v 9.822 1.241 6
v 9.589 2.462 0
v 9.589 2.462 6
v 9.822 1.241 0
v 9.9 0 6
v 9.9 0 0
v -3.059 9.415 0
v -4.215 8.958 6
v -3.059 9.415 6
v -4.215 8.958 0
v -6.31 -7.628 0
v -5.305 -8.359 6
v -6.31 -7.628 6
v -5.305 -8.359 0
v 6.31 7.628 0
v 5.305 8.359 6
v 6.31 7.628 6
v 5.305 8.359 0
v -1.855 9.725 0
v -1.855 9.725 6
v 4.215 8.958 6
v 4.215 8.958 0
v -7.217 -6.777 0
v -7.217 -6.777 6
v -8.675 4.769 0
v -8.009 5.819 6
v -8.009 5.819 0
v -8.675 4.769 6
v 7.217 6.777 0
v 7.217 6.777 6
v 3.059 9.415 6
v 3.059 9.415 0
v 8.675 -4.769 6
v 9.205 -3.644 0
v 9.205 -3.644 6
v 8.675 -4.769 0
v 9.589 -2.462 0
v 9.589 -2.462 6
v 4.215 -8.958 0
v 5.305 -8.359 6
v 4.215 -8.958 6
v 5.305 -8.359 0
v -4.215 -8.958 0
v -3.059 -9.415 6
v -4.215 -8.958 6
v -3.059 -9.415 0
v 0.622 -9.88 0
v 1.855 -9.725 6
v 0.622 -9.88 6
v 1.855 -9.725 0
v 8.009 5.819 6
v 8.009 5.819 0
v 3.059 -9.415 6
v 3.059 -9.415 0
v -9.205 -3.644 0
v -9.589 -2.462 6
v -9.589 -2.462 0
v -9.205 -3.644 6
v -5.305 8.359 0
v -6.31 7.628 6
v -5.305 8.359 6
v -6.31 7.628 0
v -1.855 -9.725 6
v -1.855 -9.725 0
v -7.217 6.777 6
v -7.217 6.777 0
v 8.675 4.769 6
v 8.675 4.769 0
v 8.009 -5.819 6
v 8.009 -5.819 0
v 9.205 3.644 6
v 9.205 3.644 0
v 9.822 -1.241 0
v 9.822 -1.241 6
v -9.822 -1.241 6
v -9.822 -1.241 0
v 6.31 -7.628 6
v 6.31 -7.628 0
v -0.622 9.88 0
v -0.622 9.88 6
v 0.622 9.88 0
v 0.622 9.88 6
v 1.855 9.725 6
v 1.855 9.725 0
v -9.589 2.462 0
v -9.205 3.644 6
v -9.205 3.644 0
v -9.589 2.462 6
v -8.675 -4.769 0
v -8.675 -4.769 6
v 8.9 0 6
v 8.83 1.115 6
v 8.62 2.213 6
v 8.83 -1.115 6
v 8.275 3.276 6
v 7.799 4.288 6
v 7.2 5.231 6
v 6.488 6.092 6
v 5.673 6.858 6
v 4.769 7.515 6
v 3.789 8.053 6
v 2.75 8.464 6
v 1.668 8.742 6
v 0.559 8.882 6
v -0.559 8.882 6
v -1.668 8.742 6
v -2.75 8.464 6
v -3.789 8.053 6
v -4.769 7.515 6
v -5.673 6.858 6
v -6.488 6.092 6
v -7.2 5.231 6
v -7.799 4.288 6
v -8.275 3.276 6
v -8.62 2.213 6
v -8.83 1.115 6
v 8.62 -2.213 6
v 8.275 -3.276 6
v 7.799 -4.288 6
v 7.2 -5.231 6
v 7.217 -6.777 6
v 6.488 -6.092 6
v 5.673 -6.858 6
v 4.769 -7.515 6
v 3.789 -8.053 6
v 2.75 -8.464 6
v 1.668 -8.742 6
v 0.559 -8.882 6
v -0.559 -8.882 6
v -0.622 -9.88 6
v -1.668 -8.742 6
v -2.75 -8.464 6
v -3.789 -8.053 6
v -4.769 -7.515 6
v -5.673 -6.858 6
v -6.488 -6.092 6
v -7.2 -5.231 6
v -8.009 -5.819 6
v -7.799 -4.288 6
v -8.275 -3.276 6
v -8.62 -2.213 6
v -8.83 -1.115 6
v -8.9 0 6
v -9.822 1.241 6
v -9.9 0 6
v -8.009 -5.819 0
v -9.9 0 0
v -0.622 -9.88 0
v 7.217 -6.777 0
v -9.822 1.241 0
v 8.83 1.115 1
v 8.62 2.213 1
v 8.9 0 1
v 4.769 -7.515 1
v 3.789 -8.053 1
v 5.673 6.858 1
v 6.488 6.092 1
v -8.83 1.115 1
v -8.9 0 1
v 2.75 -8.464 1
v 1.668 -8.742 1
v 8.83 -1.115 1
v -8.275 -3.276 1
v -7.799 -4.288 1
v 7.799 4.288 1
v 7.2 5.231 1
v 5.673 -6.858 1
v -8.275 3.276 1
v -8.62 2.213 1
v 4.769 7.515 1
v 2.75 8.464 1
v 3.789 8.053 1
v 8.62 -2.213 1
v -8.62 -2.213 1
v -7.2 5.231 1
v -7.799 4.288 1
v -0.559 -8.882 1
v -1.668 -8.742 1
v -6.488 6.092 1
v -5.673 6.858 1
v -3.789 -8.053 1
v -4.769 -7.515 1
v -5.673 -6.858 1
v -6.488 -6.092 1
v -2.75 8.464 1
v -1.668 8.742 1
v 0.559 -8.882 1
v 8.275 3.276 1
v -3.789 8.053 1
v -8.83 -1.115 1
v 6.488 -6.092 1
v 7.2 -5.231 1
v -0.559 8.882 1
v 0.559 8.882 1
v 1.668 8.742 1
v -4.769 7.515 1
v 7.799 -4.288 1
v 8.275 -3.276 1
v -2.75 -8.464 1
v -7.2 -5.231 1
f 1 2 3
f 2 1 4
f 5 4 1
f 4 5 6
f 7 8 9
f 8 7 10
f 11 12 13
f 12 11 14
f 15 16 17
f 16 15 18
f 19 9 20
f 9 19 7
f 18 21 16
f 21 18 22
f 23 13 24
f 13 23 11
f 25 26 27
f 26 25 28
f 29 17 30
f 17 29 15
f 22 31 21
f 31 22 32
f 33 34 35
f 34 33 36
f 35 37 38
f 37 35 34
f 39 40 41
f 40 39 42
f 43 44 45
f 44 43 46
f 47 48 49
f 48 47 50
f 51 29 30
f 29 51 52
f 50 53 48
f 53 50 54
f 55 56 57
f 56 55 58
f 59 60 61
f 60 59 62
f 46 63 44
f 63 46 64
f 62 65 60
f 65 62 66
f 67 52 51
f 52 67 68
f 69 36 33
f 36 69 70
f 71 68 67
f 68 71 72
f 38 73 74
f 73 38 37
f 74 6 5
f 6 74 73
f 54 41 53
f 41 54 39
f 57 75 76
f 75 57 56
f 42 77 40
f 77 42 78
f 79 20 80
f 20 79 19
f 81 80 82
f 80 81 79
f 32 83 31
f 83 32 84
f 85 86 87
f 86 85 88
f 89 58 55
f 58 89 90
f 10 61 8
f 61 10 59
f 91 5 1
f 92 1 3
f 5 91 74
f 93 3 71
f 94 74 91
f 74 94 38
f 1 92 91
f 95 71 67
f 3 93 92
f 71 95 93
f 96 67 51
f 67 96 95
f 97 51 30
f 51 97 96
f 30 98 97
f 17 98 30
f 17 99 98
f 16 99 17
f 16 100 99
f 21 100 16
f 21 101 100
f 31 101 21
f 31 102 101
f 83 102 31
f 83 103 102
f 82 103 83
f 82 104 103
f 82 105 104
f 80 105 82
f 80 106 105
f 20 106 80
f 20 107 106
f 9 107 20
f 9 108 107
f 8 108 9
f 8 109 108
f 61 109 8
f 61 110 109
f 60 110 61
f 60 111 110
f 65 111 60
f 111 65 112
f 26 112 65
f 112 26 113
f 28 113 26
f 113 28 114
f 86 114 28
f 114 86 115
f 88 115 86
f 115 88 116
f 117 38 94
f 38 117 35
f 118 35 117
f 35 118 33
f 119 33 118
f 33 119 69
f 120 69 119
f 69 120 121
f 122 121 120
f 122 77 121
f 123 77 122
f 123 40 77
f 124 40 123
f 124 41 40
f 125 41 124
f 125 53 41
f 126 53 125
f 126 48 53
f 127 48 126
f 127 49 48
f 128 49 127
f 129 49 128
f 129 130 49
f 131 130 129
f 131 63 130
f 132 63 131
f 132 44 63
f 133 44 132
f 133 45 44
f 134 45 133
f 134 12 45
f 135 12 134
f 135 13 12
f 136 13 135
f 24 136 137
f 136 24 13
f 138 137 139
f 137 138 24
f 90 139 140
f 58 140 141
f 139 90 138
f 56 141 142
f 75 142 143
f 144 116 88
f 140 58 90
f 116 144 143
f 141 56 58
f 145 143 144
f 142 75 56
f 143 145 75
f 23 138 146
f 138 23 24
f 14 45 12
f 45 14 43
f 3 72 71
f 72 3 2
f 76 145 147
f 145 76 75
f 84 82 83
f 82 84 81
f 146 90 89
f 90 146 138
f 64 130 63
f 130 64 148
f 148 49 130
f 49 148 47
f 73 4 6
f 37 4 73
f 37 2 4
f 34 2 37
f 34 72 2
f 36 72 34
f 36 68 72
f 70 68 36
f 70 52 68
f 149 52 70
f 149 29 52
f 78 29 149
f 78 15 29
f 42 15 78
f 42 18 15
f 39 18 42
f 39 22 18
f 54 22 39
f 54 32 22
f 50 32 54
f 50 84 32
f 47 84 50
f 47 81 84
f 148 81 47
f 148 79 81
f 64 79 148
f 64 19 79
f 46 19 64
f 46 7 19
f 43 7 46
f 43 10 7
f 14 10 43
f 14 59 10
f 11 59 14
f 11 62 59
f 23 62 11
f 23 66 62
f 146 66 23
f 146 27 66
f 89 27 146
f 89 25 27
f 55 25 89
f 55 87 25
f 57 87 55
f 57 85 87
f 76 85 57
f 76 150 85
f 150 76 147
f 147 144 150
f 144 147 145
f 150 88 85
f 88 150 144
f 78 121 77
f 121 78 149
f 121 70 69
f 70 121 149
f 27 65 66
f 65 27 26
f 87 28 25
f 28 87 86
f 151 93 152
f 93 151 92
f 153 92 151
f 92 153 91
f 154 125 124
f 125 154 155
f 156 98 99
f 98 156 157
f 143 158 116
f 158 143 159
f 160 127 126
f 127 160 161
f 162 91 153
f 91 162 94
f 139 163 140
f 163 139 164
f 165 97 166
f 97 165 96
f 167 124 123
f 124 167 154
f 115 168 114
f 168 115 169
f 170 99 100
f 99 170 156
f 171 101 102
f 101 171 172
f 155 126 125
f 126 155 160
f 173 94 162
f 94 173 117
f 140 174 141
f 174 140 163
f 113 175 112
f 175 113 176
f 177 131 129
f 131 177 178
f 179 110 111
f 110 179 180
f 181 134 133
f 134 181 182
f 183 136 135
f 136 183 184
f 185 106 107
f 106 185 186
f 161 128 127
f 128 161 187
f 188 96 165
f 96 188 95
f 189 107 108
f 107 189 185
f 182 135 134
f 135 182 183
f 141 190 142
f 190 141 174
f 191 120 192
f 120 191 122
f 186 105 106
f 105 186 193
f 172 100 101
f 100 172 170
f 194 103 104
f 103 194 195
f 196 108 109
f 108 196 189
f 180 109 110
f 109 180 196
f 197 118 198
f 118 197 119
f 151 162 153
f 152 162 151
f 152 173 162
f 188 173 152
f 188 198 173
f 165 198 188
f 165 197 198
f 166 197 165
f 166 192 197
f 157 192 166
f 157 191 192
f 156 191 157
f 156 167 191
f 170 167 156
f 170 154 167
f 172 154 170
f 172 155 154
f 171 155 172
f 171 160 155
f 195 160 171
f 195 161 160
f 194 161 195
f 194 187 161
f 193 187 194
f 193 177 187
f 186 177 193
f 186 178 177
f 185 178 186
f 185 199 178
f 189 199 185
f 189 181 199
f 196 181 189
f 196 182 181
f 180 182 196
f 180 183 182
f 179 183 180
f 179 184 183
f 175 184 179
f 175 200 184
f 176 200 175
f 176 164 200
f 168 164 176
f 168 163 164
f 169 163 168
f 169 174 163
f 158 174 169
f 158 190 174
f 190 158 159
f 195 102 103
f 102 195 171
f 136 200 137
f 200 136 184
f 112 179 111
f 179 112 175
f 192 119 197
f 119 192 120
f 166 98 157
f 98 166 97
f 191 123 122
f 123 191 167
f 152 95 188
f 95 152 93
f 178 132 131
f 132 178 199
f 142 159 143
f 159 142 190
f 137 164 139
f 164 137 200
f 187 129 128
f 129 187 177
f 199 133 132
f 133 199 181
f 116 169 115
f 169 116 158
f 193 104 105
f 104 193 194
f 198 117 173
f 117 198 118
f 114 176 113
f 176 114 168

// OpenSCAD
/*
 * Created by:
 * Thomas Buck <xythobuz@xythobuz.de> in March 2016
 *
 * Licensed under the Creative Commons - Attribution license.
 */

// -----------------------------------------------------------

$fn = 50;

/*
 * Depending on your printer and exact settings, you need to adjust
 * this parameter. I've had a tight fit with 17.8mm for a 17mm lens.
 */
diameter = 17.8; // diameter of the lens

width = 1; // wall thickness
bottom_width = 1; // bottom wall thickness
height = 6; // height of the whole lens cap

// -----------------------------------------------------------

difference() {
    // whole part
    cylinder(h = height, d = (diameter + (2 * width)));

    translate([0, 0, bottom_width])
        cylinder(h = height - bottom_width, d = diameter);
}
